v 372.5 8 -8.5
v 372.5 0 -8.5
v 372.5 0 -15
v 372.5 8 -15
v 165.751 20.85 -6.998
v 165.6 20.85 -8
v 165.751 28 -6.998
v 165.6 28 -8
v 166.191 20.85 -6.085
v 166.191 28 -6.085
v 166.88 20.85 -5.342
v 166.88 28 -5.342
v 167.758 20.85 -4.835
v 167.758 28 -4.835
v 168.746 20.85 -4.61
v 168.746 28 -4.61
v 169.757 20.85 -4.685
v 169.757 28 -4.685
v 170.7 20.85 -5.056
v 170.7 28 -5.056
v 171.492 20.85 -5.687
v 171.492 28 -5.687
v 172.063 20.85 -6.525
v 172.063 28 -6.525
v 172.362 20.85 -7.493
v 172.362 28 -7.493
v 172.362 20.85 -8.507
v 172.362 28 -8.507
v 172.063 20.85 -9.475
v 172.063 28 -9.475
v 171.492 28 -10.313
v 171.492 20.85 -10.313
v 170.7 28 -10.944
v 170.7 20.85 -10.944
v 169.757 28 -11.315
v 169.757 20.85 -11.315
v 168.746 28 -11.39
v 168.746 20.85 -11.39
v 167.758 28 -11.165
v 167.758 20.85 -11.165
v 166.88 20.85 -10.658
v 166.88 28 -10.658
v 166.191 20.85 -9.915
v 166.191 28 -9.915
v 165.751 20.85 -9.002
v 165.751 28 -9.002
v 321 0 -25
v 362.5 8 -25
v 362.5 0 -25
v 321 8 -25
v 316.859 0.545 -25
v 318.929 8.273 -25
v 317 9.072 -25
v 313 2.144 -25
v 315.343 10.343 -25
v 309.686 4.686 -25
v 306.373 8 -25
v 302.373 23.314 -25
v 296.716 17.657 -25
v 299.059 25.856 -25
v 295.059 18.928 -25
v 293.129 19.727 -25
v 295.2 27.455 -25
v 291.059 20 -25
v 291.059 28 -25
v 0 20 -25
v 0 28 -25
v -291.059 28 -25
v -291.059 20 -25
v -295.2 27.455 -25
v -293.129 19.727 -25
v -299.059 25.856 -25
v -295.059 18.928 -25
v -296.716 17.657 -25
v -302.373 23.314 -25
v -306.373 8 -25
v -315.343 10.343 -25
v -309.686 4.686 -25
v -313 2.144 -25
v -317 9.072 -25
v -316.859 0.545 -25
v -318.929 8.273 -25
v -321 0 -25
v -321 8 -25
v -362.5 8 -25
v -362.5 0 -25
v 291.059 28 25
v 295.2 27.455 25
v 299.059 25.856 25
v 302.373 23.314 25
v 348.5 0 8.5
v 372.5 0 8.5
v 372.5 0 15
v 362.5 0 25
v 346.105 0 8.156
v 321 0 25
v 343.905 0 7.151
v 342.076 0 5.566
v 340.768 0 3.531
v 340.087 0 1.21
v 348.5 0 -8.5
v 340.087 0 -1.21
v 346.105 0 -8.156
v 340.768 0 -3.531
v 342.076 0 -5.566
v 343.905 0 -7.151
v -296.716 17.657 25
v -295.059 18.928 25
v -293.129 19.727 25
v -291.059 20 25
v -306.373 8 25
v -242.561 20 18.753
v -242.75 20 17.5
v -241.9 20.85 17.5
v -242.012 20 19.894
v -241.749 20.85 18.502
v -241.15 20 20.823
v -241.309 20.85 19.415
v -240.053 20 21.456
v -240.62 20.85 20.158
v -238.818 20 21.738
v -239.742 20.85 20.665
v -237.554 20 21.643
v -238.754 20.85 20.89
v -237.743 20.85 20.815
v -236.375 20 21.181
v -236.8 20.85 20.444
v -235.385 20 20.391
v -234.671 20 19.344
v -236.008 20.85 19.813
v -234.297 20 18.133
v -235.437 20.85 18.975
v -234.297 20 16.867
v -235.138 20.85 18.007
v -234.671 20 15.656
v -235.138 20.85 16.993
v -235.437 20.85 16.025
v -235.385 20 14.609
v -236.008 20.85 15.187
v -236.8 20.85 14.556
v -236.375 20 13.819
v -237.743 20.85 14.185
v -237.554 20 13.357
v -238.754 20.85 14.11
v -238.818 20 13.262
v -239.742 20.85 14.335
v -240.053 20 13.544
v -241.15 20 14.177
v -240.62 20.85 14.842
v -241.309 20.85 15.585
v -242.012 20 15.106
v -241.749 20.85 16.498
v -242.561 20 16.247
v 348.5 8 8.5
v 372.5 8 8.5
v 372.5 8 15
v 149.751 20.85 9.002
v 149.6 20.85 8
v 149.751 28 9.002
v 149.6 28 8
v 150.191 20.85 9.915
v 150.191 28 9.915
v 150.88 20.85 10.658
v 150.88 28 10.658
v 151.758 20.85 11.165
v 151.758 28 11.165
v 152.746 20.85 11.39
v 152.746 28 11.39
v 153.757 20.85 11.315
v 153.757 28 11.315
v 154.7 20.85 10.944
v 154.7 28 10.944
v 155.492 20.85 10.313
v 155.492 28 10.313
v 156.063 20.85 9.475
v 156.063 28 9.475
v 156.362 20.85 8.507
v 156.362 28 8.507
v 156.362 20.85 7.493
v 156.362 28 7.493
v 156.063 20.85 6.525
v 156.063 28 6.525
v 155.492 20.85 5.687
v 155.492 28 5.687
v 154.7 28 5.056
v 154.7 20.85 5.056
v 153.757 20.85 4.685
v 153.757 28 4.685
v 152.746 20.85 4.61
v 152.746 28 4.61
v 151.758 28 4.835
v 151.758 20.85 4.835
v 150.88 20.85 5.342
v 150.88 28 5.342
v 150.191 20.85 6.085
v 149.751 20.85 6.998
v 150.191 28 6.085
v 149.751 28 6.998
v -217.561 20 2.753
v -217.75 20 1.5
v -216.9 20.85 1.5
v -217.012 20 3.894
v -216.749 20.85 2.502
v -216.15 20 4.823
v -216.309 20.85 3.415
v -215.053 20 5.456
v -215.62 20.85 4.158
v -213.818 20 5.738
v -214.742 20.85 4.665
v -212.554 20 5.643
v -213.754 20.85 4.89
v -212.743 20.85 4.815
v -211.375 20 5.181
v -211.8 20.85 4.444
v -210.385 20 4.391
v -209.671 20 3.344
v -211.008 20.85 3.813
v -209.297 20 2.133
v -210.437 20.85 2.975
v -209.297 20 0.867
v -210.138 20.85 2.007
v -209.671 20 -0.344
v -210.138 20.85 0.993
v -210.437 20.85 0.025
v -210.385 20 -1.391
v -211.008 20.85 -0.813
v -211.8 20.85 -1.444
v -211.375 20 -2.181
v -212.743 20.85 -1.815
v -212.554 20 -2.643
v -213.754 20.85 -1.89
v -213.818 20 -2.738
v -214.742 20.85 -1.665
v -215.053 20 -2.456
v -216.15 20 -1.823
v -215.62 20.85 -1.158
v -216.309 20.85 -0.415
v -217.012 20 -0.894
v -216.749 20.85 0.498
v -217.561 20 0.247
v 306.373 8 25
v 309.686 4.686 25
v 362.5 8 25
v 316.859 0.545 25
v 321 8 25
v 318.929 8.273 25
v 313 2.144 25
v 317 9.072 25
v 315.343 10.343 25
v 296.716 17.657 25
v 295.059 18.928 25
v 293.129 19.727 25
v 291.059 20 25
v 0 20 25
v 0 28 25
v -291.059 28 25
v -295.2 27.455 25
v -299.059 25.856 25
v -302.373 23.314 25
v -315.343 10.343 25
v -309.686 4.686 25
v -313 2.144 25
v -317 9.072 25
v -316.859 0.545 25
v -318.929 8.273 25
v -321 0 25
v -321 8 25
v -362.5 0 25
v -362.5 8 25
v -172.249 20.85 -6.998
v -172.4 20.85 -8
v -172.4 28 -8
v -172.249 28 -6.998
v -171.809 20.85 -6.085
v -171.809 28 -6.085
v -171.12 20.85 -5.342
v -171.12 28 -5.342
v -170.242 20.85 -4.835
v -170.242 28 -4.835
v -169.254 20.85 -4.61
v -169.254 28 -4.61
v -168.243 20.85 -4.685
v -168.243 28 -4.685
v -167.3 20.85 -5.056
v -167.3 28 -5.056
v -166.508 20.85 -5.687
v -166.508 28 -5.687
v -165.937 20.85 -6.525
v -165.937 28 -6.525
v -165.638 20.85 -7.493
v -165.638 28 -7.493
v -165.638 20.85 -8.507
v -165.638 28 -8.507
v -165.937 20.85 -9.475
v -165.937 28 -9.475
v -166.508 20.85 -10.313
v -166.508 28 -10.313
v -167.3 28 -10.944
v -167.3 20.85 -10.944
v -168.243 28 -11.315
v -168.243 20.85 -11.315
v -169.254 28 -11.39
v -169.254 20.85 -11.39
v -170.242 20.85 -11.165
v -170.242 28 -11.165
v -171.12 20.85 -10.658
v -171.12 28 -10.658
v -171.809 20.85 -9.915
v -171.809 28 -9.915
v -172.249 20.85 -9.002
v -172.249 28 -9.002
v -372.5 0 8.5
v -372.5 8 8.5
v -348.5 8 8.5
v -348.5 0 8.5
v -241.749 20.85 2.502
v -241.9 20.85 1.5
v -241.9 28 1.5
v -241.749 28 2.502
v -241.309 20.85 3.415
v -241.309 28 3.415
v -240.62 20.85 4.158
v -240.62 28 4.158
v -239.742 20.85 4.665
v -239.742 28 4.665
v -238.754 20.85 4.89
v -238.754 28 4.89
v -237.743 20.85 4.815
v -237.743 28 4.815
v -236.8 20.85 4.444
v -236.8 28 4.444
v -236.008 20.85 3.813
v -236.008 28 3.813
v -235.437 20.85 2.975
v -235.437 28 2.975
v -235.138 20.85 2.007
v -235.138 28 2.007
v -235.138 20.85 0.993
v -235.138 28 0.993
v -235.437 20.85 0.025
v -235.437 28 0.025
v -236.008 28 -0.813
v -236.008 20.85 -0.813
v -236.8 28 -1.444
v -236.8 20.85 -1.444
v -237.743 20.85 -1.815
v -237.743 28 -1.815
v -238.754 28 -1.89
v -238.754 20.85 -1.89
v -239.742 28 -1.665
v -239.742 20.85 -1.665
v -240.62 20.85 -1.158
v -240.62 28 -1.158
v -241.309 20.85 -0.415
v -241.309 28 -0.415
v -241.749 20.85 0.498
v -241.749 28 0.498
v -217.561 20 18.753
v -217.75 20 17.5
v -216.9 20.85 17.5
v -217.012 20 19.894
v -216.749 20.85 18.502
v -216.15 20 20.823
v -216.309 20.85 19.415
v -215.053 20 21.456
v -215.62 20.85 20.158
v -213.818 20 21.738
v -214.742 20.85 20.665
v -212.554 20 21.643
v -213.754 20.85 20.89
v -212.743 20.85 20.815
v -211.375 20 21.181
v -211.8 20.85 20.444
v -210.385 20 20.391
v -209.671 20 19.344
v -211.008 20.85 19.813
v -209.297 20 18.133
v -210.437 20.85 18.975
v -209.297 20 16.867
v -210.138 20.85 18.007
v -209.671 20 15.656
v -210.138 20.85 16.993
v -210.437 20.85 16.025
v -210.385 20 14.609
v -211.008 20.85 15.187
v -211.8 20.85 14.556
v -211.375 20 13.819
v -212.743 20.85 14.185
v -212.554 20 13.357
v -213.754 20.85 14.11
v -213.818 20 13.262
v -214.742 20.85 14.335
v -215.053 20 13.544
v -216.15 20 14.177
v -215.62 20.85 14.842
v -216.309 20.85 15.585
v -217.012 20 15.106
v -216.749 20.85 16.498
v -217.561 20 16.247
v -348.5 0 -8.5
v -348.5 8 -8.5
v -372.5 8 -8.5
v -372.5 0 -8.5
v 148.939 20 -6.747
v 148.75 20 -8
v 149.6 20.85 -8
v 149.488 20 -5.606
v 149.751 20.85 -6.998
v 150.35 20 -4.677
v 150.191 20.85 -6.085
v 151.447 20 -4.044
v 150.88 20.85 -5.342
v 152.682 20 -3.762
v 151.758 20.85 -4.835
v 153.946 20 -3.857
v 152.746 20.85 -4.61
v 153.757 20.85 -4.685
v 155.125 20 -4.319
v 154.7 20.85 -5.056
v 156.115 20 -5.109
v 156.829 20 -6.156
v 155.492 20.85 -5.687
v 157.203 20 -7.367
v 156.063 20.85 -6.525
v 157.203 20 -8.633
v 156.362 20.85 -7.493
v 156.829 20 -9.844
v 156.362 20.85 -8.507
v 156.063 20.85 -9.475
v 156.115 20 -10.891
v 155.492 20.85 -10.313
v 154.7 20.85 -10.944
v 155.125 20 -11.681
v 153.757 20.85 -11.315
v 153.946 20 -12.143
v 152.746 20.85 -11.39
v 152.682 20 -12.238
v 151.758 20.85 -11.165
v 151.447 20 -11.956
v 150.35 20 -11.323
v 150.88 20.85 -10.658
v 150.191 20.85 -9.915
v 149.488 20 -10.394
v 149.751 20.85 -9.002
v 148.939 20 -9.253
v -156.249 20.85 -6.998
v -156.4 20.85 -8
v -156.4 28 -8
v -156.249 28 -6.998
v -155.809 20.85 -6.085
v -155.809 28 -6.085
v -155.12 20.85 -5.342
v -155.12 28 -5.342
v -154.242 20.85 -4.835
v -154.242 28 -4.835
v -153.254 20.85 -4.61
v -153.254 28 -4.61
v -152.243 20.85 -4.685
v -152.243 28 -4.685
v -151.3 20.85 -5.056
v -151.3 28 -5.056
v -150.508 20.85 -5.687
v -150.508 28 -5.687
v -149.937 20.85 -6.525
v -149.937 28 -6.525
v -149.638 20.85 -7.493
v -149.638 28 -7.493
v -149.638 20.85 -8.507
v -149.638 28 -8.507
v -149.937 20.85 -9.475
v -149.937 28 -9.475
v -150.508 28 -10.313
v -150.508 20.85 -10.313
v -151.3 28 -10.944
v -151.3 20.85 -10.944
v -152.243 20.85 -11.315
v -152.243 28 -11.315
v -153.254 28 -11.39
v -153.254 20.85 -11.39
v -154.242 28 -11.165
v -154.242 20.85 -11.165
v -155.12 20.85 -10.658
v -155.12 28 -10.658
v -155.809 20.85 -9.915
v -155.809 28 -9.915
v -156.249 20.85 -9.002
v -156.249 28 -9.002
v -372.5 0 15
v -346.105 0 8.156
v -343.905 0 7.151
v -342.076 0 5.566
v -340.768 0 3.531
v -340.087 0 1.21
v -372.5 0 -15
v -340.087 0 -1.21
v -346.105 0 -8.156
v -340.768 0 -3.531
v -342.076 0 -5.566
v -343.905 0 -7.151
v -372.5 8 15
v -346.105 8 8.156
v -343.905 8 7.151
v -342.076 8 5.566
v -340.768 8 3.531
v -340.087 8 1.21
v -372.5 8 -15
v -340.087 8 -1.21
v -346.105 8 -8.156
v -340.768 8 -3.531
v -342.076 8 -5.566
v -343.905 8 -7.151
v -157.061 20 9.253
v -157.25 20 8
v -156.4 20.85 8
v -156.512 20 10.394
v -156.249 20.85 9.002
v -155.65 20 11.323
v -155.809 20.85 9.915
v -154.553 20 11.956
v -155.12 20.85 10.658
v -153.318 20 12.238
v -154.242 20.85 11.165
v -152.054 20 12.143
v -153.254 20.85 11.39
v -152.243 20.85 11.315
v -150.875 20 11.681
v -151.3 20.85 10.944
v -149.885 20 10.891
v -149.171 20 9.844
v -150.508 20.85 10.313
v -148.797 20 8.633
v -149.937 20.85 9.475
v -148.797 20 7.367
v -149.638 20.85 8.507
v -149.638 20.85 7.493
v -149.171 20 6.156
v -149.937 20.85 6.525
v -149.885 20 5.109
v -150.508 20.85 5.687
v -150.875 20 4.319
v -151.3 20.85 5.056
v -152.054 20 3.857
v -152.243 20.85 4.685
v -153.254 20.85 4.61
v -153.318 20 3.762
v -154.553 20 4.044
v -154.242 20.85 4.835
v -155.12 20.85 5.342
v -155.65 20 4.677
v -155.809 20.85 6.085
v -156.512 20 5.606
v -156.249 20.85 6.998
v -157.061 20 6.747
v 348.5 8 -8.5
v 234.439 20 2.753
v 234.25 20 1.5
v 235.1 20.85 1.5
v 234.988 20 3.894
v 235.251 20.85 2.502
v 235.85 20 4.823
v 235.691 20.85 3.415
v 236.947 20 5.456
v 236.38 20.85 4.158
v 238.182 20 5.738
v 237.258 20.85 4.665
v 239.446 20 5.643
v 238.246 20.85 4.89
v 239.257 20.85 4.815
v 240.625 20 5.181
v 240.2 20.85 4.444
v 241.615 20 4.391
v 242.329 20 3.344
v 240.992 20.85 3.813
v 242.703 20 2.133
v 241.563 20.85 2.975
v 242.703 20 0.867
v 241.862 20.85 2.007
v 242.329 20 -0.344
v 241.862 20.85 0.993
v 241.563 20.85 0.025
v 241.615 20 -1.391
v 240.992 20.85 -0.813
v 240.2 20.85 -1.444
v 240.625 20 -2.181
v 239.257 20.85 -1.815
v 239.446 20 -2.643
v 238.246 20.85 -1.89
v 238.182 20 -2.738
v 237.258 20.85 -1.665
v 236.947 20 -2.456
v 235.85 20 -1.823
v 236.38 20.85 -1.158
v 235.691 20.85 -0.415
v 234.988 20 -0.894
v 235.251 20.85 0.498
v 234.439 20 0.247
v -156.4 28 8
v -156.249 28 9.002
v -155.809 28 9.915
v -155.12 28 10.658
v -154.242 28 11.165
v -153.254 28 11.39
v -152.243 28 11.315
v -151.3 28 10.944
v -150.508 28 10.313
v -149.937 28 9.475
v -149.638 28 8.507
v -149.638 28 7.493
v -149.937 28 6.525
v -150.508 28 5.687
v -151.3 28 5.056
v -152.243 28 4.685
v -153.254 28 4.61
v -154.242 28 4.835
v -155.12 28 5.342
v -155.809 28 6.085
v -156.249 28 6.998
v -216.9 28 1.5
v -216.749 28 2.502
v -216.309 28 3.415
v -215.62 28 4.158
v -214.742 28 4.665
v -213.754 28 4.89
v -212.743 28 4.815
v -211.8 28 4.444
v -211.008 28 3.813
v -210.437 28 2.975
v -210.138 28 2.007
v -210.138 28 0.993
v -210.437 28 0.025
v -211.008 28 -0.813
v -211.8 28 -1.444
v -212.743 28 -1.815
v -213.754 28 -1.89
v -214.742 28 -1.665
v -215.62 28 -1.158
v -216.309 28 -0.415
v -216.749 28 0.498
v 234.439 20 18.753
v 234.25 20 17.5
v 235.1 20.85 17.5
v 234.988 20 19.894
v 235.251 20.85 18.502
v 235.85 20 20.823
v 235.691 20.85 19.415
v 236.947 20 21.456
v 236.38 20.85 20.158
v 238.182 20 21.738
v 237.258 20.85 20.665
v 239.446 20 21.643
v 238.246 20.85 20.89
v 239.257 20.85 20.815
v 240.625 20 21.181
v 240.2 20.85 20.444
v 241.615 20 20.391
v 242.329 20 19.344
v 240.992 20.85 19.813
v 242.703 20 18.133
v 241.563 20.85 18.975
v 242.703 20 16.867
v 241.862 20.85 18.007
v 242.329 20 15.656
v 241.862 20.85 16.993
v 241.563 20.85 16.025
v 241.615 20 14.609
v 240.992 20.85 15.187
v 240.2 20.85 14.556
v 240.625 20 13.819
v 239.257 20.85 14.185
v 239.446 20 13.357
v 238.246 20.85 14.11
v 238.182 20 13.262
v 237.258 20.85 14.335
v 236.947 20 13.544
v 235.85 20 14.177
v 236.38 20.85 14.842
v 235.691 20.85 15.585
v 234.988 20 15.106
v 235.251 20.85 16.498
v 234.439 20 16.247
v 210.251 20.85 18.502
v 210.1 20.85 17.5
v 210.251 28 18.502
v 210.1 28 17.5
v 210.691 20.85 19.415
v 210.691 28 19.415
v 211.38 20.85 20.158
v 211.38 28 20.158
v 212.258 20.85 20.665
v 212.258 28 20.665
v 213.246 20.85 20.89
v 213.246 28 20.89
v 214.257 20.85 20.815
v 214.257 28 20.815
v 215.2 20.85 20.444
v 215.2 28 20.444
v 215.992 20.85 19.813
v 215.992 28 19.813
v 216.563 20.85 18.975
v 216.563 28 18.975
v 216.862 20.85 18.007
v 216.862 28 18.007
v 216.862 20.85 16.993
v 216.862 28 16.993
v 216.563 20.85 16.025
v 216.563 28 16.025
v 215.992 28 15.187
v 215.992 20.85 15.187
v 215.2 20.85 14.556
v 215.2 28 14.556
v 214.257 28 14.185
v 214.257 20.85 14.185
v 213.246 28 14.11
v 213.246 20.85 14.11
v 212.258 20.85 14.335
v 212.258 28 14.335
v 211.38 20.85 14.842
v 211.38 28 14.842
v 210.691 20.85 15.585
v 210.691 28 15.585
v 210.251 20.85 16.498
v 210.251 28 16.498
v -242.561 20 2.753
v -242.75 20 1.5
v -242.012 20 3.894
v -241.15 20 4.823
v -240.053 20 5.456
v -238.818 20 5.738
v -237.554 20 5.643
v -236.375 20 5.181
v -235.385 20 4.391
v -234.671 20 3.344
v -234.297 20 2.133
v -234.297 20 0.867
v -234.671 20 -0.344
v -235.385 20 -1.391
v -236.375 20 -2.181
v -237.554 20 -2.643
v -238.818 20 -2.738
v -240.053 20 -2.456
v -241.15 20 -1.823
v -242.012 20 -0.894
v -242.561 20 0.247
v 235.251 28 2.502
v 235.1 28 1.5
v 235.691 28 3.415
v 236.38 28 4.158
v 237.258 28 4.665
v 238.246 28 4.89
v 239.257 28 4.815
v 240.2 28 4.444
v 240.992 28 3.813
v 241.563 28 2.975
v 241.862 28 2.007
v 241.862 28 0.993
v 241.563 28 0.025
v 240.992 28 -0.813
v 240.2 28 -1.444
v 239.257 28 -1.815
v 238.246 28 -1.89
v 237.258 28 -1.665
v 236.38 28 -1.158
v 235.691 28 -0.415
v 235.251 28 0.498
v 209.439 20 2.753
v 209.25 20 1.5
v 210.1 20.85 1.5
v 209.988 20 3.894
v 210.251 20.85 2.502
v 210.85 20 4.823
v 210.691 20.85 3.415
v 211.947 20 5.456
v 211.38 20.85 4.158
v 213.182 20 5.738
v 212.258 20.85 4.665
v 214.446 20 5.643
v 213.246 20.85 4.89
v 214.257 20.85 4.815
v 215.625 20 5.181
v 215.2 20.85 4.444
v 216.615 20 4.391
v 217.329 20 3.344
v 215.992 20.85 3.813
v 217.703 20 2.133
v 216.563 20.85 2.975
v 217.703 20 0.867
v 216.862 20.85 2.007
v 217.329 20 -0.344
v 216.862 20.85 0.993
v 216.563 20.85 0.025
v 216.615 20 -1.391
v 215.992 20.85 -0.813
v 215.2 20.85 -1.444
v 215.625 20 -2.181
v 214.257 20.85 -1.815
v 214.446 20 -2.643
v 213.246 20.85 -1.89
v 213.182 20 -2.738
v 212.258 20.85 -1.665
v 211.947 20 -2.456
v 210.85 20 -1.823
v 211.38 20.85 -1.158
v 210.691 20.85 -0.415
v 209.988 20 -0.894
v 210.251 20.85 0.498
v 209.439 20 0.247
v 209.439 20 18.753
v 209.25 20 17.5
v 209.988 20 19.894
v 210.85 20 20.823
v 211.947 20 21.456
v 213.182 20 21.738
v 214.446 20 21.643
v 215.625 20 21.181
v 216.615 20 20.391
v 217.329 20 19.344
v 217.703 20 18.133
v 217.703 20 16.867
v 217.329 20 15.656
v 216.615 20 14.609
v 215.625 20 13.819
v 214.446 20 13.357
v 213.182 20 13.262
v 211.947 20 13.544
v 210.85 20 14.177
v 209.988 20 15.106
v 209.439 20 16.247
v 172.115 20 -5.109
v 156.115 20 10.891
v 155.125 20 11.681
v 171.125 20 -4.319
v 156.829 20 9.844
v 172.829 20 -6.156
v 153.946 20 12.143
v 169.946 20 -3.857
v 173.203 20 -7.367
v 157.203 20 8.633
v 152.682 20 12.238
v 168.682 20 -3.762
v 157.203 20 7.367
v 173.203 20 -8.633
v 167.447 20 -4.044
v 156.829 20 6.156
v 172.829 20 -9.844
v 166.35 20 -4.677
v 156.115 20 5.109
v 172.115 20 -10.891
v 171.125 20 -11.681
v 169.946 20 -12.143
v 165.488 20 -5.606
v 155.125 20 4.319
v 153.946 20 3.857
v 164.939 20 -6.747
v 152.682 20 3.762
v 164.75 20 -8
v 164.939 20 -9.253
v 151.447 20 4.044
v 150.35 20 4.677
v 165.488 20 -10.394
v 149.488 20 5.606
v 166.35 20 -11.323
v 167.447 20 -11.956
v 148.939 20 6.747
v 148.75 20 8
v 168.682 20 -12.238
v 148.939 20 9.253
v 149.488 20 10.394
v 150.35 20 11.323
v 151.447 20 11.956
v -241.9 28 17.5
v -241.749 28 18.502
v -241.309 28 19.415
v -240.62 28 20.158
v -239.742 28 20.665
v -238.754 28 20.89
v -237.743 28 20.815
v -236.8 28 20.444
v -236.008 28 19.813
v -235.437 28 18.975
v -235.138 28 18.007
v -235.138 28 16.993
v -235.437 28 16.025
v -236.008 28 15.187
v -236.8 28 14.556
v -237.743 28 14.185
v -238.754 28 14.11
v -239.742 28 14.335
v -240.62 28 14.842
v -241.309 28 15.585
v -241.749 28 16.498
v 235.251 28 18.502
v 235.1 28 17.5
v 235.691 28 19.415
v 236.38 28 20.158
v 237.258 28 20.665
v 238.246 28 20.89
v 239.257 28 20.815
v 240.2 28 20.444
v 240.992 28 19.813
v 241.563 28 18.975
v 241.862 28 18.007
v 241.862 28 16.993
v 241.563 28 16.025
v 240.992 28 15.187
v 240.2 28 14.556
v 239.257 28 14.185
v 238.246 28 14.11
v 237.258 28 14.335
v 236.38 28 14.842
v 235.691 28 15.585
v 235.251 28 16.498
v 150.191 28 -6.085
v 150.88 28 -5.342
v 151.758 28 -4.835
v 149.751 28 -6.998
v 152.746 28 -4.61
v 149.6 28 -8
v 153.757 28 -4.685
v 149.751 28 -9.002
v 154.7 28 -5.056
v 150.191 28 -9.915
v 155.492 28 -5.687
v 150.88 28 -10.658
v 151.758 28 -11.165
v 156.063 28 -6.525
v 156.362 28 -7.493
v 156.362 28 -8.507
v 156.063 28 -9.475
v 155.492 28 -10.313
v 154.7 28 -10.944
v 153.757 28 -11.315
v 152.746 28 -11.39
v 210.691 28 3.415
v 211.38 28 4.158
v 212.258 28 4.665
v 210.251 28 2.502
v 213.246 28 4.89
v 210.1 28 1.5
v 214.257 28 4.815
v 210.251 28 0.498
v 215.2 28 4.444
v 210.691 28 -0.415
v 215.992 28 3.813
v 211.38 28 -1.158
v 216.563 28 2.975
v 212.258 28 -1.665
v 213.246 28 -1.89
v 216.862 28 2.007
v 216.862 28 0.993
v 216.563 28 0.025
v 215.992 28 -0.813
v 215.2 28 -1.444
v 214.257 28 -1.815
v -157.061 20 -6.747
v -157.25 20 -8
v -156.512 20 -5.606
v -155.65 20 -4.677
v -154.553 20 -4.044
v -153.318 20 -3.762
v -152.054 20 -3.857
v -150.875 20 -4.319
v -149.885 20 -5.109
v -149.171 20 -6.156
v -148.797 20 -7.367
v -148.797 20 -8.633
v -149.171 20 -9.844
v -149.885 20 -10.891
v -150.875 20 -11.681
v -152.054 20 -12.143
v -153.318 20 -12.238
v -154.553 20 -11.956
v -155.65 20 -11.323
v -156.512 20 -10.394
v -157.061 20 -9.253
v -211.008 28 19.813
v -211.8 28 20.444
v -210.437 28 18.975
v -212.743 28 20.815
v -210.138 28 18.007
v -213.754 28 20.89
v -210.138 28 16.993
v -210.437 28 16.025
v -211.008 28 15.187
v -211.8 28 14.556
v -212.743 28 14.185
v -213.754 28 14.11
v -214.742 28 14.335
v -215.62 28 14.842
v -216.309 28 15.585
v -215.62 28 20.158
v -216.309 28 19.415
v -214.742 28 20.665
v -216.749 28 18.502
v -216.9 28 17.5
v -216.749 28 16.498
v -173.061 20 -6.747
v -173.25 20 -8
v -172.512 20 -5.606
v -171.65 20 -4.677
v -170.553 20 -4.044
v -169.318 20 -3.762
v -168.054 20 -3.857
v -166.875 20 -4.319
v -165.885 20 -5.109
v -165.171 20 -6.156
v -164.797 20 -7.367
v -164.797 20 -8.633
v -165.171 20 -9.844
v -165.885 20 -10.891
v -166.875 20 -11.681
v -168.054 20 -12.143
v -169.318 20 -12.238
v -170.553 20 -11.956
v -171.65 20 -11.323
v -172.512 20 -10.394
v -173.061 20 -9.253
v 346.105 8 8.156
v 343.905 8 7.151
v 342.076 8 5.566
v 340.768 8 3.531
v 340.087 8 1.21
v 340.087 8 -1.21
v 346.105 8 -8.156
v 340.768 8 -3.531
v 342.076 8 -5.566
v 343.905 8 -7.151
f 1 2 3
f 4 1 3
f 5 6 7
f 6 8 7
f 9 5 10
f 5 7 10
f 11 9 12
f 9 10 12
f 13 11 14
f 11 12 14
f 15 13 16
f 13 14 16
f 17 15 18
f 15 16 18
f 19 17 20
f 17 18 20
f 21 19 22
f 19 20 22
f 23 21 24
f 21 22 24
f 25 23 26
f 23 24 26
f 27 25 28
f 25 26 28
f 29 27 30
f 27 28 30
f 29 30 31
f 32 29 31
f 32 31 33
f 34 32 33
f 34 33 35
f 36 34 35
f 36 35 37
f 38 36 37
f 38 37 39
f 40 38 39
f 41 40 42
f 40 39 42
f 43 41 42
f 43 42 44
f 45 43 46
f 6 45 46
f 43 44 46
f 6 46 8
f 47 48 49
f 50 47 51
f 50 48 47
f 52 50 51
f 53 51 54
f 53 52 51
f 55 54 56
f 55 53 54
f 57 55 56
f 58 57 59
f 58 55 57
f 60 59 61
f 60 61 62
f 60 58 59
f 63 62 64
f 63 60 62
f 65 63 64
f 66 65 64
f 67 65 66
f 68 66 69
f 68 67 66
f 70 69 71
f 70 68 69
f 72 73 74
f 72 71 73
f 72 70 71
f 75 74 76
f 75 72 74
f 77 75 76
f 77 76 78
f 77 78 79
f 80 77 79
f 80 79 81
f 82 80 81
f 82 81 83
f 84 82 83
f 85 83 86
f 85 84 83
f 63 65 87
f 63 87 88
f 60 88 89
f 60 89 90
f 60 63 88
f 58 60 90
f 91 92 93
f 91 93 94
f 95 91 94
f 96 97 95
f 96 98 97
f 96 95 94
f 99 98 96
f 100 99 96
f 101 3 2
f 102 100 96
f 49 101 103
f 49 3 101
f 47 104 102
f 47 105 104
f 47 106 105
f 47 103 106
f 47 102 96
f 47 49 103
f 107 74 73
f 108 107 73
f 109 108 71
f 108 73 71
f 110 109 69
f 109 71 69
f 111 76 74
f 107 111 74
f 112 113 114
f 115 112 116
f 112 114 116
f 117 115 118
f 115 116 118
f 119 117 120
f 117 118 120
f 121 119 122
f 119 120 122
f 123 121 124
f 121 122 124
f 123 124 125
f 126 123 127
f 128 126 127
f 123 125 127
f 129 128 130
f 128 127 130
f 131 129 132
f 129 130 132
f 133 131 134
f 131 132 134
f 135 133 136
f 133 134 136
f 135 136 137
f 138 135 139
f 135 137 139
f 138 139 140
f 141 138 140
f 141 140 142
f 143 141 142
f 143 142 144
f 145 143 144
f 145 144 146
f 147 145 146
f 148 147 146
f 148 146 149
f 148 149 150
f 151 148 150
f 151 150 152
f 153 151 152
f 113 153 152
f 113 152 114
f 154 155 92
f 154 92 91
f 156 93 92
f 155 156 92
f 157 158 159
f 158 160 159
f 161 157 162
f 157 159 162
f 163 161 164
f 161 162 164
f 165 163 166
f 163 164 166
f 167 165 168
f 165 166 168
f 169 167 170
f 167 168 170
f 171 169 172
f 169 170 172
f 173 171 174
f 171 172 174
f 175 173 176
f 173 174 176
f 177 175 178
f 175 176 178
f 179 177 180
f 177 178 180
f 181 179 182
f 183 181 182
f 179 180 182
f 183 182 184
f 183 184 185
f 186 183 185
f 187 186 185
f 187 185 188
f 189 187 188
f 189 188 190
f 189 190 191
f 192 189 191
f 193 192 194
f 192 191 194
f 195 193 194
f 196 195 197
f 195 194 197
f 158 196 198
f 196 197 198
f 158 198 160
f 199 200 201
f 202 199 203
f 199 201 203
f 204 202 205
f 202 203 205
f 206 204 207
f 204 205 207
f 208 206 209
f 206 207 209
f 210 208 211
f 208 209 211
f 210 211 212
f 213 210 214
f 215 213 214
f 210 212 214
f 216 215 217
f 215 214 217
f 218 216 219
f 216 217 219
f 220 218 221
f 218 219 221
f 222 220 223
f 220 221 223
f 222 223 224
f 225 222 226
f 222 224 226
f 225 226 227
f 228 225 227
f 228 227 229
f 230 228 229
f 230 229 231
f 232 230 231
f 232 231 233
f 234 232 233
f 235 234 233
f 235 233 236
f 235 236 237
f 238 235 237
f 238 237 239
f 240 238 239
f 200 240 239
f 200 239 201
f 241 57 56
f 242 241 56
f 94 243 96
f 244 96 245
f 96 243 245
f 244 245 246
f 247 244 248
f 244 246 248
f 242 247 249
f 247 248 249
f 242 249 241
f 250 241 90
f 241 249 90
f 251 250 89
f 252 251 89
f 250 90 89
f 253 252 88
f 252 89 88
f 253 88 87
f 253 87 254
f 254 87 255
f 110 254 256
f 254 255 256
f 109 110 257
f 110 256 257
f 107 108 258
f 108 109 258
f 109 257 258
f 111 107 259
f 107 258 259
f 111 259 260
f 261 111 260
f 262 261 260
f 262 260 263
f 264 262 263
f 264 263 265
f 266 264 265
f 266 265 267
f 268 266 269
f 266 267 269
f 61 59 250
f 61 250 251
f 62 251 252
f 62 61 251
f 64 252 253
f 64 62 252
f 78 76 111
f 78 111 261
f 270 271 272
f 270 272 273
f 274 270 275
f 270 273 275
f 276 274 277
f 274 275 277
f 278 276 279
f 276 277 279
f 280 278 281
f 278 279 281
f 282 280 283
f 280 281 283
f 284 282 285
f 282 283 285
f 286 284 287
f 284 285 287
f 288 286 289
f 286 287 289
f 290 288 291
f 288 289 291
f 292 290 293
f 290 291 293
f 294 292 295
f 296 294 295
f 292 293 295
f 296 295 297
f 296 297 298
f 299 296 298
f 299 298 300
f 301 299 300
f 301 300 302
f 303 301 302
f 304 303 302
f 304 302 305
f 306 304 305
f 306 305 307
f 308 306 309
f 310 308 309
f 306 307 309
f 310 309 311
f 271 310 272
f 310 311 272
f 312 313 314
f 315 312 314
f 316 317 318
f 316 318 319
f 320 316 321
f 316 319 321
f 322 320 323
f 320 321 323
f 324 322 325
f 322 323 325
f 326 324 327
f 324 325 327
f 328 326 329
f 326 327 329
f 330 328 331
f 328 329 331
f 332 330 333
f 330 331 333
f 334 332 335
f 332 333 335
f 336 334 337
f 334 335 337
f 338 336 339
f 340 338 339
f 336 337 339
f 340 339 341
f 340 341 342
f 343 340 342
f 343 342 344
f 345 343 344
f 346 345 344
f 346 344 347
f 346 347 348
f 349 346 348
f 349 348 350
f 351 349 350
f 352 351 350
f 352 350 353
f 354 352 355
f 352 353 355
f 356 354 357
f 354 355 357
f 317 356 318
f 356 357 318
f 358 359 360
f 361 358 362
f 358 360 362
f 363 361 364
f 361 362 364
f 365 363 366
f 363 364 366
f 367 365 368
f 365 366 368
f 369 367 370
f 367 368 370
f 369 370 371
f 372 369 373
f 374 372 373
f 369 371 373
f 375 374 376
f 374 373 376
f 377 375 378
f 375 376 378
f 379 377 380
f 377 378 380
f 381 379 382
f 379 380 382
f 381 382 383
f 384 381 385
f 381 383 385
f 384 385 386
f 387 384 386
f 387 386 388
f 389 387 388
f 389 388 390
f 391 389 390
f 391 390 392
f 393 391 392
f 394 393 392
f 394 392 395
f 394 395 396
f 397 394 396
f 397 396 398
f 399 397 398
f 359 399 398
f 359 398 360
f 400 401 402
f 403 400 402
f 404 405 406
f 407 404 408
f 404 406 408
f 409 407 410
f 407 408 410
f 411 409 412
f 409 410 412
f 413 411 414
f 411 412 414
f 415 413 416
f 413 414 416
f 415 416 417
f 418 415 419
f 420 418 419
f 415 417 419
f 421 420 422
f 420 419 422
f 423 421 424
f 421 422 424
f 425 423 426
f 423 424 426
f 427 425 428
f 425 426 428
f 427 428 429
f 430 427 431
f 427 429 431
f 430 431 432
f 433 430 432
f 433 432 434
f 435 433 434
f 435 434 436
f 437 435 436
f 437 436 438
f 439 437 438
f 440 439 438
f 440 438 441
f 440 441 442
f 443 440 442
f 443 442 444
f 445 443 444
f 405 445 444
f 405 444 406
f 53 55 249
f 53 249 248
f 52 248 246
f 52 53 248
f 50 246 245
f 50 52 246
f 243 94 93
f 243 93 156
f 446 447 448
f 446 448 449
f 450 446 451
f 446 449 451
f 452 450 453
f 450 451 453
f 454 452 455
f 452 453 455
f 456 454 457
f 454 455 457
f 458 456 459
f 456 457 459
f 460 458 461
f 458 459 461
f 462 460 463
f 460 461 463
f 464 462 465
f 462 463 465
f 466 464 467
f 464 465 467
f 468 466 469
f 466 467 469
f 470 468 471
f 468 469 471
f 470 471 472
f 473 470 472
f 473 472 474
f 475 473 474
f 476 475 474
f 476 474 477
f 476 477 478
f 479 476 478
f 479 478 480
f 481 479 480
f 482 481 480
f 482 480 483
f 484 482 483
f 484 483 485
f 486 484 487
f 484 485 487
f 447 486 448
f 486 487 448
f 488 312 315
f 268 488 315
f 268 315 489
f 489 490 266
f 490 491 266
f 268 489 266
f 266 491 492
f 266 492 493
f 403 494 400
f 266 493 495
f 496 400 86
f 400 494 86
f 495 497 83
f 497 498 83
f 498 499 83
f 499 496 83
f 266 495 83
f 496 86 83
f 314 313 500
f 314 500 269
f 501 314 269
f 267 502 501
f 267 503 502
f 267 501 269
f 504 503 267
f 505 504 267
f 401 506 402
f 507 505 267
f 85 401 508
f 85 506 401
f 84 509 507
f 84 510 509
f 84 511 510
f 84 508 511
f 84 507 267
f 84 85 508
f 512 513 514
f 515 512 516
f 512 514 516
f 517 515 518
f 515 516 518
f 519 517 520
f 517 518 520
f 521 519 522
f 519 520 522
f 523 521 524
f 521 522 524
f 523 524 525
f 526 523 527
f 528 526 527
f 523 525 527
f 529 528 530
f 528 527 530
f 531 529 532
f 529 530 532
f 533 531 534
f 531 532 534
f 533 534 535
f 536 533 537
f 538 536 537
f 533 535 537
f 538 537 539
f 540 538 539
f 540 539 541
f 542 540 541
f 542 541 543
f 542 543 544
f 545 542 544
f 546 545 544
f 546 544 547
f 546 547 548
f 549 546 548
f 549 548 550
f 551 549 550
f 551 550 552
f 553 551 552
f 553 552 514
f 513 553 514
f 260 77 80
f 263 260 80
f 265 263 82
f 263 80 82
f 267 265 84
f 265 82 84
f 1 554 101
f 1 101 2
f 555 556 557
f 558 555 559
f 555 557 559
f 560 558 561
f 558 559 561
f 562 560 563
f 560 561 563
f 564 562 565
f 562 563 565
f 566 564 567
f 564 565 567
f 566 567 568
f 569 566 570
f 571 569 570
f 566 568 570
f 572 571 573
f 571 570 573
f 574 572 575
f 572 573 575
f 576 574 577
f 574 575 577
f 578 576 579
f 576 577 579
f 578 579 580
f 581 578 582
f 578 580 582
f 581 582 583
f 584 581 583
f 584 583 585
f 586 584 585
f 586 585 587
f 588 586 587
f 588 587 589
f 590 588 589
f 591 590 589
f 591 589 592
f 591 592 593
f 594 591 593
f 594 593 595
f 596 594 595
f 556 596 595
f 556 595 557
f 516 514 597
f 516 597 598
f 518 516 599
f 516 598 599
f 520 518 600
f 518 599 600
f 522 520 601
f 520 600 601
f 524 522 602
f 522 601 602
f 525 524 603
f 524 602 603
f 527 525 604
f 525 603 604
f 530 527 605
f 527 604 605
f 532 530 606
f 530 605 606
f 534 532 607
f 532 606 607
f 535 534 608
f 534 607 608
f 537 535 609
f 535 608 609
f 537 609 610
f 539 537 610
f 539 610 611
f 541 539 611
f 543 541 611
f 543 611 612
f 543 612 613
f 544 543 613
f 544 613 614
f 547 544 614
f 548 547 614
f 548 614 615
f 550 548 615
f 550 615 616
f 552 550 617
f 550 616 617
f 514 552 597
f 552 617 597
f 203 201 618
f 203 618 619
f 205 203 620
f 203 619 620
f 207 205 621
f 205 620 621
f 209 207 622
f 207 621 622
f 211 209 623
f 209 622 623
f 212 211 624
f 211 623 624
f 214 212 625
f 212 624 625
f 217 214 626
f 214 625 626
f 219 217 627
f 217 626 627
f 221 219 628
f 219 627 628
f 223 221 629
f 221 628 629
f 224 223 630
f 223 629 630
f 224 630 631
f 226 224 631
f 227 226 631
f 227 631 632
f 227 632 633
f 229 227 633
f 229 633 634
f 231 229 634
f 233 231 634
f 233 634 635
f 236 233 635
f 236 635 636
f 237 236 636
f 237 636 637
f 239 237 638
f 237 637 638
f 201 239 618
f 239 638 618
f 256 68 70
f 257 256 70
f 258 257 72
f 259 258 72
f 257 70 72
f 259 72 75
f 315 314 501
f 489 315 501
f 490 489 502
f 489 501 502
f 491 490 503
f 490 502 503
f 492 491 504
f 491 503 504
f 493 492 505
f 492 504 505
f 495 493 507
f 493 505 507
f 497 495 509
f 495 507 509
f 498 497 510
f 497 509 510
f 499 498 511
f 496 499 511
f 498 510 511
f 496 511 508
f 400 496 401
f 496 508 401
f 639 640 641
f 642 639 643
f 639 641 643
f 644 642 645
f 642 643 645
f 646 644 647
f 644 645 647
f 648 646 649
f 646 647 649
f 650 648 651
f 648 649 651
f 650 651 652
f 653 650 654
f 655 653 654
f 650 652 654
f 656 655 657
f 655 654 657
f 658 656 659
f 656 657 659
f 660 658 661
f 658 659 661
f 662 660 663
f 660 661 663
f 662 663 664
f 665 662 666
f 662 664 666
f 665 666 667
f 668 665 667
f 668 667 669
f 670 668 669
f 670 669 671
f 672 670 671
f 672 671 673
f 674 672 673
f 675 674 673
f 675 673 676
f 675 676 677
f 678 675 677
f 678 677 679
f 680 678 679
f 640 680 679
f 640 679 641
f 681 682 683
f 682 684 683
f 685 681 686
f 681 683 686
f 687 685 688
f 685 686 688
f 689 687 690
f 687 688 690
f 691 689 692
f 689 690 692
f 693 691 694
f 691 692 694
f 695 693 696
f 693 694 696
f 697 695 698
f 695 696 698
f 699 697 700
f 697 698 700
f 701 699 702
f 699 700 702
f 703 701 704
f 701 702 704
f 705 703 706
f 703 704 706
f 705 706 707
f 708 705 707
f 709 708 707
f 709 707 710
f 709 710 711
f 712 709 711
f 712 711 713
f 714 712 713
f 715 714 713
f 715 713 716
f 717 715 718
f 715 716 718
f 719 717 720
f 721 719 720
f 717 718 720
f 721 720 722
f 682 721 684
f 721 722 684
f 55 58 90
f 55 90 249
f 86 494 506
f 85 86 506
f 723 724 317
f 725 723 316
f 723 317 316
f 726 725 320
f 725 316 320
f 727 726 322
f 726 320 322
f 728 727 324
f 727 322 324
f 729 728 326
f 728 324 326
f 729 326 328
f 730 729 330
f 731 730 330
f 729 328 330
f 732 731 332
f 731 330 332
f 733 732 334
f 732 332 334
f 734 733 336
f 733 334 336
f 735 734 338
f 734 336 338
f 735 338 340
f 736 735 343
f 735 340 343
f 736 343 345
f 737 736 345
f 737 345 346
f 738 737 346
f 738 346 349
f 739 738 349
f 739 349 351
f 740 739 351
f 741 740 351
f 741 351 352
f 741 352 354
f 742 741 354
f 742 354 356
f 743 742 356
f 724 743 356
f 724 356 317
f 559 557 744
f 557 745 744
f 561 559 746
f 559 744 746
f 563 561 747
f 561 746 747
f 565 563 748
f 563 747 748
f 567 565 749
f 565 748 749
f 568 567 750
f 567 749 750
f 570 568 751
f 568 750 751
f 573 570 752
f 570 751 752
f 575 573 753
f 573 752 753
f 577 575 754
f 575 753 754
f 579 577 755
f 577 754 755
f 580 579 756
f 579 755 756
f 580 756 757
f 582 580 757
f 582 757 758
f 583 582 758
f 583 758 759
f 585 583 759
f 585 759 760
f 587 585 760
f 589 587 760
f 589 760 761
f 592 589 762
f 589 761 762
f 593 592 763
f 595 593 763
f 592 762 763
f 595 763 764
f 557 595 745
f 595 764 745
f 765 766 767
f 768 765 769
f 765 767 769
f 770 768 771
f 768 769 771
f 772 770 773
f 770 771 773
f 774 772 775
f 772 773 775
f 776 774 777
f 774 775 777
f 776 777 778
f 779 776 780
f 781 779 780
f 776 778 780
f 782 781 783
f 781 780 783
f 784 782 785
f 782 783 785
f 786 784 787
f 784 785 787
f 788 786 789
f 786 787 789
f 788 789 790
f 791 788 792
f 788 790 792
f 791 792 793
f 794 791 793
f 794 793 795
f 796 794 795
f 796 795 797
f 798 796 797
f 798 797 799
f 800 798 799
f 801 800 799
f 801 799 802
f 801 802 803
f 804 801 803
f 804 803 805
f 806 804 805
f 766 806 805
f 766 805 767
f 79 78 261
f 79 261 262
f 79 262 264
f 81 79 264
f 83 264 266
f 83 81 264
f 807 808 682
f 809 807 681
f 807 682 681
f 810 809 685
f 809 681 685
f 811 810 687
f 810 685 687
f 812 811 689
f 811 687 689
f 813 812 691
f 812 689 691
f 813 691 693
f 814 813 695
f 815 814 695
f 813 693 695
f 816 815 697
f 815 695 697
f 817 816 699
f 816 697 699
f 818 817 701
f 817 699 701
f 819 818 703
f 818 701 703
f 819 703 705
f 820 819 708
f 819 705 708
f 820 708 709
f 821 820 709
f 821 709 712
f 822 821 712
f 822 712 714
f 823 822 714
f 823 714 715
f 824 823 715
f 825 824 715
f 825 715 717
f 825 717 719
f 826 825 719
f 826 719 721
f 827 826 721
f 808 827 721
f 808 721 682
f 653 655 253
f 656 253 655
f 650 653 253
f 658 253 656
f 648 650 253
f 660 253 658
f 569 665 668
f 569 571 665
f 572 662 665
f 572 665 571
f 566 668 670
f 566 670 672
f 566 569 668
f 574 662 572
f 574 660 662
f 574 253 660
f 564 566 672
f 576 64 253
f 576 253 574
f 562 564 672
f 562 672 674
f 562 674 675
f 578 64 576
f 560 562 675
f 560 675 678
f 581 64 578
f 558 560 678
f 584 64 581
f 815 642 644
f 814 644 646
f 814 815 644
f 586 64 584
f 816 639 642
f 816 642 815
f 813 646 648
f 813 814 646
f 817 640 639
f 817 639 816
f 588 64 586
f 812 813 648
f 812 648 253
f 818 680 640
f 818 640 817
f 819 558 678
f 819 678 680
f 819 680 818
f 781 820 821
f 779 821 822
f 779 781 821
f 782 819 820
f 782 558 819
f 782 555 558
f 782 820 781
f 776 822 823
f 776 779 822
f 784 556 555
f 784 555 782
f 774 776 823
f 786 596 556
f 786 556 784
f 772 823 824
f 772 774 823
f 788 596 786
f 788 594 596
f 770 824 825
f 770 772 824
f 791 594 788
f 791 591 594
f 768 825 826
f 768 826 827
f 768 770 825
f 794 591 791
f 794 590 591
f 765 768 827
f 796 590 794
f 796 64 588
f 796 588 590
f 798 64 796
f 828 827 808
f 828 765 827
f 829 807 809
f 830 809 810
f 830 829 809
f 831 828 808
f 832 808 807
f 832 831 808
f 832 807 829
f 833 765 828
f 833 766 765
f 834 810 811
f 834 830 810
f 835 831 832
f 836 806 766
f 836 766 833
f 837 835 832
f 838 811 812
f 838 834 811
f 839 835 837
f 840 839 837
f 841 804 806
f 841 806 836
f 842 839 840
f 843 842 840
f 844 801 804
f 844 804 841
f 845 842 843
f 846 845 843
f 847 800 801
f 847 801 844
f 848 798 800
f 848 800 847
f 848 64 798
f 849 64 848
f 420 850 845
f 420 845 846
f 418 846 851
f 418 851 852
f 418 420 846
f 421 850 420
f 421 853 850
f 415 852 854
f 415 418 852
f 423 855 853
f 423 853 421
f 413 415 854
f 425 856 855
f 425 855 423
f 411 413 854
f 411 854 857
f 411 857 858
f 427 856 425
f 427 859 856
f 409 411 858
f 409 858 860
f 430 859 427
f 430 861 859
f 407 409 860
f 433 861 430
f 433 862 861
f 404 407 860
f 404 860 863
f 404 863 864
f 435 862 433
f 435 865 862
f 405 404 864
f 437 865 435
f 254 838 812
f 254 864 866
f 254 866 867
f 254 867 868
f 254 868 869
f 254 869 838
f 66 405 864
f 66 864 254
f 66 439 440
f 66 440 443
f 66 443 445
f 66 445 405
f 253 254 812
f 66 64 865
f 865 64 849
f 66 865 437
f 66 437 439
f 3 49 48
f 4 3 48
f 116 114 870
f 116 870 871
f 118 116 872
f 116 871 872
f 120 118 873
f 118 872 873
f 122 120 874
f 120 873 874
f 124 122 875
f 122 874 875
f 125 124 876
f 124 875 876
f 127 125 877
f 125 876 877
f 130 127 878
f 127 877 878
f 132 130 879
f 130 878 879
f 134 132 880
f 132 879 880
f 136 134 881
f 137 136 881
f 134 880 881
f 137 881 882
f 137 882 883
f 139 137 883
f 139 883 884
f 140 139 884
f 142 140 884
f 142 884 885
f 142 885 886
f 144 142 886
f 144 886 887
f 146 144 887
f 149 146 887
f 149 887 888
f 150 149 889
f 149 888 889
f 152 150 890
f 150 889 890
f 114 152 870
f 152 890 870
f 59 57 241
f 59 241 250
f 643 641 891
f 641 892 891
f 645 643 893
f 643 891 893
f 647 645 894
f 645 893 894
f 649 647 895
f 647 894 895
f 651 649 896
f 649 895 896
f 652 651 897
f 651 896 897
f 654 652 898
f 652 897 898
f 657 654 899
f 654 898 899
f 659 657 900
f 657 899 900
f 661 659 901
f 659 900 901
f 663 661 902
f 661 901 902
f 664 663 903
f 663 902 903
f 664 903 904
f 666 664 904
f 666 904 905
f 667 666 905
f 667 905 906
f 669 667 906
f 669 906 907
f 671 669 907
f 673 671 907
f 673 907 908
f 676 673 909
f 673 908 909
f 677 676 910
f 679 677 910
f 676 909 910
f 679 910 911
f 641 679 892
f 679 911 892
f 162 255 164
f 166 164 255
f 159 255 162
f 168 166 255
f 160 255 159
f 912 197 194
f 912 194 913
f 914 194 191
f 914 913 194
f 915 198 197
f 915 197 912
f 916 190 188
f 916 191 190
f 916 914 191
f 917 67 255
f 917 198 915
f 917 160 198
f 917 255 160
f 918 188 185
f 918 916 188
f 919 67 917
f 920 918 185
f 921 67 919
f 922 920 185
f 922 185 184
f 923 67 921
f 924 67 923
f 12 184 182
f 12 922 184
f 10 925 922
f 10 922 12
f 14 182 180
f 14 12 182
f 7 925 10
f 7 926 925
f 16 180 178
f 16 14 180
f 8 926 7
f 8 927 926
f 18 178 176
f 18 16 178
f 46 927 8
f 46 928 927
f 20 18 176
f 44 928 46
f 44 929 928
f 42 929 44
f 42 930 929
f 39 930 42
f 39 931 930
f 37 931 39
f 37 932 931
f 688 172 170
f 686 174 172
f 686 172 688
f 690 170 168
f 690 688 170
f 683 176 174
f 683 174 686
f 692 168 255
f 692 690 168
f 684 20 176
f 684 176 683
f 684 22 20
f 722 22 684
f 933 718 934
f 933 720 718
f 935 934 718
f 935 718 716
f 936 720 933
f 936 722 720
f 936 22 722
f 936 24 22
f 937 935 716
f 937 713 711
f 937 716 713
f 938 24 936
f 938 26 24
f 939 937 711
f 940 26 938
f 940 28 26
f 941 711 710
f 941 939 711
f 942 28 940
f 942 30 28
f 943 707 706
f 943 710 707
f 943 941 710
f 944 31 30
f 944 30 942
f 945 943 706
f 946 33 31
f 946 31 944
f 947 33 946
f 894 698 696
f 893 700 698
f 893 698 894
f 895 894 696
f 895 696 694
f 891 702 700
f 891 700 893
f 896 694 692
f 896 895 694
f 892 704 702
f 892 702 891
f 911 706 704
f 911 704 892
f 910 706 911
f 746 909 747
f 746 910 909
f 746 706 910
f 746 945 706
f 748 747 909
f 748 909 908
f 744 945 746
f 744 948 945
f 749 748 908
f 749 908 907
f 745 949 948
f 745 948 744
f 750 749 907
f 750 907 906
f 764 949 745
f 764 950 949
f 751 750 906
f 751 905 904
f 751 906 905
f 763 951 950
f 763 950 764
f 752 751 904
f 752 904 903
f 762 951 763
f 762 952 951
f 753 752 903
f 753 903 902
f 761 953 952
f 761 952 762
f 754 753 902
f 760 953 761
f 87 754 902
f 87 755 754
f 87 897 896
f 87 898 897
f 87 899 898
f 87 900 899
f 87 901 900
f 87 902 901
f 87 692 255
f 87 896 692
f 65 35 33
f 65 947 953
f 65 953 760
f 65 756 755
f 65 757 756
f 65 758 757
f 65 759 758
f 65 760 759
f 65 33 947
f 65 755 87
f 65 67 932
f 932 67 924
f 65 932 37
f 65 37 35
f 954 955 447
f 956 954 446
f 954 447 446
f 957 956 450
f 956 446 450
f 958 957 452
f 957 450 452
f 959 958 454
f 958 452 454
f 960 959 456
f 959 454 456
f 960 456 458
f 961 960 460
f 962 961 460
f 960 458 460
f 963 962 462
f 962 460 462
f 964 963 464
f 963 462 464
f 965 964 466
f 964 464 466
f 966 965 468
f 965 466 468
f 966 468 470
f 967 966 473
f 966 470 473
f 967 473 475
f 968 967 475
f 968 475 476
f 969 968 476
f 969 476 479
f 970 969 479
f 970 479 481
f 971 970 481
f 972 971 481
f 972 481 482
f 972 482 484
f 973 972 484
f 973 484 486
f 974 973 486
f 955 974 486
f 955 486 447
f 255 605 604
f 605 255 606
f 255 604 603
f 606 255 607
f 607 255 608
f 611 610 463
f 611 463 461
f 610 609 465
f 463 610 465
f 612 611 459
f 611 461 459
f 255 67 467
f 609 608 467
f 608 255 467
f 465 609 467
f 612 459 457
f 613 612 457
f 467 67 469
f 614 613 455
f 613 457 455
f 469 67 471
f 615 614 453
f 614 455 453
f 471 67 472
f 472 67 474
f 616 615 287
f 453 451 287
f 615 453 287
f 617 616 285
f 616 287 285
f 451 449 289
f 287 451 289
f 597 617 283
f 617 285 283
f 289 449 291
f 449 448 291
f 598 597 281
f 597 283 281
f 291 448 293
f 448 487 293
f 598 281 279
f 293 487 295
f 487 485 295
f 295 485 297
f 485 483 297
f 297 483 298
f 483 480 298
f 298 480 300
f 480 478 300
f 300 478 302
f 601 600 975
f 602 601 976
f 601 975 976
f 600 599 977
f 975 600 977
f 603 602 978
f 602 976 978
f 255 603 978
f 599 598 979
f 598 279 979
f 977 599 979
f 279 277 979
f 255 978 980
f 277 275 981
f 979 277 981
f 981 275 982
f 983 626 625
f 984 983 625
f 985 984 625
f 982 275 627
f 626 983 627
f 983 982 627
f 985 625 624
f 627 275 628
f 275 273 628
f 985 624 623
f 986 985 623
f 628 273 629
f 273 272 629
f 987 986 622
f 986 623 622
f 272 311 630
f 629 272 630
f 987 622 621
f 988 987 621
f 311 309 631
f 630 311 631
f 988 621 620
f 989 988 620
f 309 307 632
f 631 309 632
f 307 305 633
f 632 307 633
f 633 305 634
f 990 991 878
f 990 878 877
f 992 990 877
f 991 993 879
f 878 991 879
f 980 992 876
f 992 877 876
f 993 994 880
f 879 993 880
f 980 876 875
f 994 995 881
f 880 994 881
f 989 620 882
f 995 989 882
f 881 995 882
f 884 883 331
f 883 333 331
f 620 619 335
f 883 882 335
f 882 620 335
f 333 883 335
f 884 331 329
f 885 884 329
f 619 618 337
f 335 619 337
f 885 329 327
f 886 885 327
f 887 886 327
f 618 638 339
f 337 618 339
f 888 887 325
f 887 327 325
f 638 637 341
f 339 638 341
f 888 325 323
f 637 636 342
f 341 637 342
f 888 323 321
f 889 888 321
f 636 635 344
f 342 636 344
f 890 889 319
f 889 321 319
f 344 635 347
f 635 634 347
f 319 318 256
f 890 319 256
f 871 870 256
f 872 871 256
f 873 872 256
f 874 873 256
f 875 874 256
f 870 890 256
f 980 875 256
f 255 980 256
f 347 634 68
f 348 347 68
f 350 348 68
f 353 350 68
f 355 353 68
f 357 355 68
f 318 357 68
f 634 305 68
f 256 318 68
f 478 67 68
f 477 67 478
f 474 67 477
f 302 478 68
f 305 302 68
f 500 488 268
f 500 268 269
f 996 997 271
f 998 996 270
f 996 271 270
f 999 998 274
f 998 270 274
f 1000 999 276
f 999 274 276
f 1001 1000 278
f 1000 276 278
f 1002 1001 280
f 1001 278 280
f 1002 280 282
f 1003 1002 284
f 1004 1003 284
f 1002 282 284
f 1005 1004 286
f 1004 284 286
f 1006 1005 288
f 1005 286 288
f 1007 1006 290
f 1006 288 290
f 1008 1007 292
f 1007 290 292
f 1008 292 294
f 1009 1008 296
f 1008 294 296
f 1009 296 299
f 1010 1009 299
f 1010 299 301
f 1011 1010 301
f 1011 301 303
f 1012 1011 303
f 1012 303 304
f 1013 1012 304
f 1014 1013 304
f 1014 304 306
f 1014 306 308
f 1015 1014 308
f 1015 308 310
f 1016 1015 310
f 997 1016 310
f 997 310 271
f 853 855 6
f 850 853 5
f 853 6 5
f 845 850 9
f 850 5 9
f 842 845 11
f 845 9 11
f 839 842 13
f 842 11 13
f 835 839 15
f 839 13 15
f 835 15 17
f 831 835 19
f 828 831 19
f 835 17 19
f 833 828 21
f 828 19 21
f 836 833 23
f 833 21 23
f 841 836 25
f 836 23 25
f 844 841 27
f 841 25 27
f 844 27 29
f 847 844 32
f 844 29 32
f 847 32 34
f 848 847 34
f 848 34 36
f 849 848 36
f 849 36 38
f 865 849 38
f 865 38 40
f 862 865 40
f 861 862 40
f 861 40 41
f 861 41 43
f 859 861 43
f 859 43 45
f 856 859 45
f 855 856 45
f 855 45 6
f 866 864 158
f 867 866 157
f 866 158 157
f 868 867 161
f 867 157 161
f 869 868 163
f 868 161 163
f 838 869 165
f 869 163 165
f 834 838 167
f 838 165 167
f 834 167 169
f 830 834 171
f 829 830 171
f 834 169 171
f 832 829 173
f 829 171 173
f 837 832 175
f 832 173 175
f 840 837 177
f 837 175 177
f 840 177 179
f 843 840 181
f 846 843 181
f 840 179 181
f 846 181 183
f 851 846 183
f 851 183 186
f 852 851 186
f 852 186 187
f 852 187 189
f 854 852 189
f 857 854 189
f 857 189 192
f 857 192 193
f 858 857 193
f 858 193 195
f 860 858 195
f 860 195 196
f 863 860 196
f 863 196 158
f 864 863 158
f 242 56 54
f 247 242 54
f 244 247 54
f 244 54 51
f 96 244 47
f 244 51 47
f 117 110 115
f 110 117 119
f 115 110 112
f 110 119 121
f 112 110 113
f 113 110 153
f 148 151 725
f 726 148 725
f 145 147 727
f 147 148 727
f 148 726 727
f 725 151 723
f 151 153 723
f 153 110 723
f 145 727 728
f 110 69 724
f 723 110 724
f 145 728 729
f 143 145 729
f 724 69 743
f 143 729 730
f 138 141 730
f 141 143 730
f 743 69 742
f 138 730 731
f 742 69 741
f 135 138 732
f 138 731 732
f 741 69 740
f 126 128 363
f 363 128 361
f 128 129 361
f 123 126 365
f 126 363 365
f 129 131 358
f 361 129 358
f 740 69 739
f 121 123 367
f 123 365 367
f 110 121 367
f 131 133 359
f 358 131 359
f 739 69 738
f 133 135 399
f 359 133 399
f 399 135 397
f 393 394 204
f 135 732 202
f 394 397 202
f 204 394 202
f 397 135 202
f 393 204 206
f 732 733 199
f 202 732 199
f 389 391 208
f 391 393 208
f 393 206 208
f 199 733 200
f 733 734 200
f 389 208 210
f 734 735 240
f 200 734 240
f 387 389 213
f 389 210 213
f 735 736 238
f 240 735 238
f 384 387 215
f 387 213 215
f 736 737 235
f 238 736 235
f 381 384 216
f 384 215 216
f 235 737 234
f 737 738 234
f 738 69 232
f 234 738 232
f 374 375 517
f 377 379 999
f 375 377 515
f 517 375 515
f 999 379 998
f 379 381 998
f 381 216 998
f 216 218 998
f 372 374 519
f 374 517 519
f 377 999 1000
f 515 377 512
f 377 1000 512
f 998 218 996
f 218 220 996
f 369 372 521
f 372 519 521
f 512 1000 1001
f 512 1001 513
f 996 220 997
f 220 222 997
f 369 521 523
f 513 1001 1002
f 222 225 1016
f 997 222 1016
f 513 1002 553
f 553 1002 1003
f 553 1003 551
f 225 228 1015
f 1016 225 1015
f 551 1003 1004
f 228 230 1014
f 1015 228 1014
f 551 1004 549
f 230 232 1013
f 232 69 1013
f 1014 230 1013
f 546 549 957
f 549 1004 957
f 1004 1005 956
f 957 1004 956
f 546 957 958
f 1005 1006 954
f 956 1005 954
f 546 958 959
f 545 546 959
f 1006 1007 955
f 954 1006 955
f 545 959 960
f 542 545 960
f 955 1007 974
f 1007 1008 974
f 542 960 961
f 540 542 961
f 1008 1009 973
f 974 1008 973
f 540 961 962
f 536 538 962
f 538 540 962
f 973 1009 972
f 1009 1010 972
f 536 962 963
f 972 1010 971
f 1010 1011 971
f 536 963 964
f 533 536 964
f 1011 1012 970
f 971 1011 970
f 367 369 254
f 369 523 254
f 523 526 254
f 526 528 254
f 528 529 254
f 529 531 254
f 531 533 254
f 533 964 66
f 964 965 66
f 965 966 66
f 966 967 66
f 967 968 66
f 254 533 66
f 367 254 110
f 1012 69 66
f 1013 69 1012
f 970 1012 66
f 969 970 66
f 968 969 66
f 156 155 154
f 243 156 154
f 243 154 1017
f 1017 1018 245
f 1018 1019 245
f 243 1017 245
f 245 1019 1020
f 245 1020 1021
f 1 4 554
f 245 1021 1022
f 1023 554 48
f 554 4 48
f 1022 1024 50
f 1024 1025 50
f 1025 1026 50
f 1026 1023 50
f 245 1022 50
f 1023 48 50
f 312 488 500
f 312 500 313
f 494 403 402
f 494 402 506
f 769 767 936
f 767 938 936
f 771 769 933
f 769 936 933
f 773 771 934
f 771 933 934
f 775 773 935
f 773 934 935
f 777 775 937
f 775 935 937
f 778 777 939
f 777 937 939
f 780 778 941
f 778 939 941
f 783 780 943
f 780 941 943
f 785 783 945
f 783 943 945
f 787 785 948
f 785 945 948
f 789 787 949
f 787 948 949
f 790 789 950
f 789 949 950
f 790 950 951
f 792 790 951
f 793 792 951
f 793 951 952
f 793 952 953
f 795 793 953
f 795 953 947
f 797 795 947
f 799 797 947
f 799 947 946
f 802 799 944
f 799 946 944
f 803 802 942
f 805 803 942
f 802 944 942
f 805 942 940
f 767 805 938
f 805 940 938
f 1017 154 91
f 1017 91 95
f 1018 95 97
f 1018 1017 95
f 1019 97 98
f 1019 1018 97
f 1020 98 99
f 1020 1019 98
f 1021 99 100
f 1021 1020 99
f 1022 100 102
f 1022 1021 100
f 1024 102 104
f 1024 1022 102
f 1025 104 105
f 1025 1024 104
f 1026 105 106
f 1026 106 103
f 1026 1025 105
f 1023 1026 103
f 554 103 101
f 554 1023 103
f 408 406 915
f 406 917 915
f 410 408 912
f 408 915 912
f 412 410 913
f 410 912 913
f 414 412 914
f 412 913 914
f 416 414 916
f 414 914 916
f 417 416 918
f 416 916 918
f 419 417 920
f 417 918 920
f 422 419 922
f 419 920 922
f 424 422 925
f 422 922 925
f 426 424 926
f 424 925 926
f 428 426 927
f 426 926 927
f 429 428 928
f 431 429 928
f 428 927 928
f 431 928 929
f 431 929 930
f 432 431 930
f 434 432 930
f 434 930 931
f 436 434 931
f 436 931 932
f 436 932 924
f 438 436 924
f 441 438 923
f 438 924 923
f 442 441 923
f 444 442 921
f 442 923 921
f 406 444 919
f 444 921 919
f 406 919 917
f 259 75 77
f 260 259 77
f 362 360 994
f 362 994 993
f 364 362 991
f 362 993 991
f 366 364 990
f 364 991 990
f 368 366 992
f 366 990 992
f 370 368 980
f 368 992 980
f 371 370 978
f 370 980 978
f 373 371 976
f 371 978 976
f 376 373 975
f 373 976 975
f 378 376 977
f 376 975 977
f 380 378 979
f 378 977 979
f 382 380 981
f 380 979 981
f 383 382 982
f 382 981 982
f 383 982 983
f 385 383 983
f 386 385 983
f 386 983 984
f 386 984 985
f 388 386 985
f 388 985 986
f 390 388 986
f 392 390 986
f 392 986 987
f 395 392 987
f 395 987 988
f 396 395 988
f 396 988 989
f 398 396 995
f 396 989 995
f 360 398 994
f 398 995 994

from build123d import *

# Parameters (mm, degrees)
SKETCH_1_W             = 372.5
SKETCH_1_H             = 50
SM_BASE_FLANGE_1_DEPTH = 8
OTHER_START            = -25
OTHER_1_DEPTH          = 50
OTHER_1_2_DEPTH        = 50
CHAMFER_1_SIZE         = 10
CUT_EXTRUDE_1_DEPTH    = 374.873307418
M8X1_251_D             = 6.8
M8X1_251_CSINK_D       = 8.5
M8X1_251_CSINK_ANGLE   = 90


# Read off the part's stored shape, not the designer's step: Изгиб1
# Sheet-metal steps are written as plain solids
with BuildPart() as part:
    # Sketch 1 → Базовая кромка1 (new body)
    with BuildSketch(Plane(origin=(0, 0, 0), x_dir=(1, 0, 0), z_dir=(0, 1, 0))):
        with Locations((-186.25, 0)):
            Rectangle(SKETCH_1_W, SKETCH_1_H)
    extrude(amount=SM_BASE_FLANGE_1_DEPTH)

    # Other 1 outline → Other 1 (cut)
    with BuildSketch(Plane.XY.offset(OTHER_START)):
        with BuildLine():
            Line((-306.372583002, 8), (-309.68629166, 4.68629166))
            ThreePointArc((-309.68629166, 4.68629166), (-314.877065168, 1.217927687), (-321, 2.25e-07))
            Line((-321, 2.25e-07), (0, 0))
            Line((0, 0), (0, 8))
            Line((0, 8), (-306.372583002, 8))
        make_face()
    extrude(amount=OTHER_1_DEPTH, mode=Mode.SUBTRACT)

    # Other 1 2 outline → Other 1 2 (add)
    with BuildSketch(Plane.XY.offset(OTHER_START)):
        with BuildLine():
            Line((-321, 8.000000225), (-306.372583002, 8))
            Line((-306.372583002, 8), (-296.715728655, 17.656854152))
            ThreePointArc((-296.715728655, 17.656854152), (-294.120341909, 19.391036132), (-291.058874503, 19.999999862))
            Line((-291.058874503, 19.999999862), (0, 20))
            Line((0, 20), (0, 28))
            Line((0, 28), (-291.058874503, 27.999999862))
            ThreePointArc((-291.058874503, 27.999999862), (-297.181809368, 26.782072393), (-302.372582904, 23.313708401))
            Line((-302.372582904, 23.313708401), (-315.343145909, 10.343145909))
            ThreePointArc((-315.343145909, 10.343145909), (-317.938532627, 8.608963948), (-321, 8.000000225))
        make_face()
    extrude(amount=OTHER_1_2_DEPTH)

    # Фаска1
    chamfer_1_edges = [part.edges().sort_by_distance(p)[0] for p in [
        (-372.5, 4, -25),
        (-372.5, 4, 25),
    ]]
    chamfer(chamfer_1_edges, length=CHAMFER_1_SIZE)

    # Эскиз4 → Вытянуть1 (cut, through all)
    with BuildSketch(Plane(origin=(0, 8, 0), x_dir=(1, 0, 0), z_dir=(0, 1, 0))):
        with BuildLine():
            Line((-348.5, 8.5), (-372.5, 8.5))
            Line((-372.5, 8.5), (-372.5, -8.5))
            Line((-372.5, -8.5), (-348.5, -8.5))
            ThreePointArc((-348.5, -8.5), (-340, 0), (-348.5, 8.5))
        make_face()
    extrude(amount=-CUT_EXTRUDE_1_DEPTH, mode=Mode.SUBTRACT)

    # Зеркальное отражение1: part across plane


with BuildPart() as part_1:
    add(part.part)
    add(part.part.mirror(Plane(origin=(0, 28, -25), x_dir=(0, 0, 1), z_dir=(-1, 0, 0))))

    # Отверстие обработанное метчиком M8x1.251 (through all)
    with Locations(Plane.XZ.offset(-20)):
        with Locations((-238.5, 17.5), (-238.5, 1.5), (-213.5, 1.5), (-213.5, 17.5), (-153, -8), (-153, 8), (-169, -8), (213.5, 1.5), (238.5, 1.5), (238.5, 17.5), (213.5, 17.5), (169, -8), (153, -8), (153, 8)):
            CounterSinkHole(M8X1_251_D / 2, M8X1_251_CSINK_D / 2, counter_sink_angle=M8X1_251_CSINK_ANGLE)


solid = part_1.part
